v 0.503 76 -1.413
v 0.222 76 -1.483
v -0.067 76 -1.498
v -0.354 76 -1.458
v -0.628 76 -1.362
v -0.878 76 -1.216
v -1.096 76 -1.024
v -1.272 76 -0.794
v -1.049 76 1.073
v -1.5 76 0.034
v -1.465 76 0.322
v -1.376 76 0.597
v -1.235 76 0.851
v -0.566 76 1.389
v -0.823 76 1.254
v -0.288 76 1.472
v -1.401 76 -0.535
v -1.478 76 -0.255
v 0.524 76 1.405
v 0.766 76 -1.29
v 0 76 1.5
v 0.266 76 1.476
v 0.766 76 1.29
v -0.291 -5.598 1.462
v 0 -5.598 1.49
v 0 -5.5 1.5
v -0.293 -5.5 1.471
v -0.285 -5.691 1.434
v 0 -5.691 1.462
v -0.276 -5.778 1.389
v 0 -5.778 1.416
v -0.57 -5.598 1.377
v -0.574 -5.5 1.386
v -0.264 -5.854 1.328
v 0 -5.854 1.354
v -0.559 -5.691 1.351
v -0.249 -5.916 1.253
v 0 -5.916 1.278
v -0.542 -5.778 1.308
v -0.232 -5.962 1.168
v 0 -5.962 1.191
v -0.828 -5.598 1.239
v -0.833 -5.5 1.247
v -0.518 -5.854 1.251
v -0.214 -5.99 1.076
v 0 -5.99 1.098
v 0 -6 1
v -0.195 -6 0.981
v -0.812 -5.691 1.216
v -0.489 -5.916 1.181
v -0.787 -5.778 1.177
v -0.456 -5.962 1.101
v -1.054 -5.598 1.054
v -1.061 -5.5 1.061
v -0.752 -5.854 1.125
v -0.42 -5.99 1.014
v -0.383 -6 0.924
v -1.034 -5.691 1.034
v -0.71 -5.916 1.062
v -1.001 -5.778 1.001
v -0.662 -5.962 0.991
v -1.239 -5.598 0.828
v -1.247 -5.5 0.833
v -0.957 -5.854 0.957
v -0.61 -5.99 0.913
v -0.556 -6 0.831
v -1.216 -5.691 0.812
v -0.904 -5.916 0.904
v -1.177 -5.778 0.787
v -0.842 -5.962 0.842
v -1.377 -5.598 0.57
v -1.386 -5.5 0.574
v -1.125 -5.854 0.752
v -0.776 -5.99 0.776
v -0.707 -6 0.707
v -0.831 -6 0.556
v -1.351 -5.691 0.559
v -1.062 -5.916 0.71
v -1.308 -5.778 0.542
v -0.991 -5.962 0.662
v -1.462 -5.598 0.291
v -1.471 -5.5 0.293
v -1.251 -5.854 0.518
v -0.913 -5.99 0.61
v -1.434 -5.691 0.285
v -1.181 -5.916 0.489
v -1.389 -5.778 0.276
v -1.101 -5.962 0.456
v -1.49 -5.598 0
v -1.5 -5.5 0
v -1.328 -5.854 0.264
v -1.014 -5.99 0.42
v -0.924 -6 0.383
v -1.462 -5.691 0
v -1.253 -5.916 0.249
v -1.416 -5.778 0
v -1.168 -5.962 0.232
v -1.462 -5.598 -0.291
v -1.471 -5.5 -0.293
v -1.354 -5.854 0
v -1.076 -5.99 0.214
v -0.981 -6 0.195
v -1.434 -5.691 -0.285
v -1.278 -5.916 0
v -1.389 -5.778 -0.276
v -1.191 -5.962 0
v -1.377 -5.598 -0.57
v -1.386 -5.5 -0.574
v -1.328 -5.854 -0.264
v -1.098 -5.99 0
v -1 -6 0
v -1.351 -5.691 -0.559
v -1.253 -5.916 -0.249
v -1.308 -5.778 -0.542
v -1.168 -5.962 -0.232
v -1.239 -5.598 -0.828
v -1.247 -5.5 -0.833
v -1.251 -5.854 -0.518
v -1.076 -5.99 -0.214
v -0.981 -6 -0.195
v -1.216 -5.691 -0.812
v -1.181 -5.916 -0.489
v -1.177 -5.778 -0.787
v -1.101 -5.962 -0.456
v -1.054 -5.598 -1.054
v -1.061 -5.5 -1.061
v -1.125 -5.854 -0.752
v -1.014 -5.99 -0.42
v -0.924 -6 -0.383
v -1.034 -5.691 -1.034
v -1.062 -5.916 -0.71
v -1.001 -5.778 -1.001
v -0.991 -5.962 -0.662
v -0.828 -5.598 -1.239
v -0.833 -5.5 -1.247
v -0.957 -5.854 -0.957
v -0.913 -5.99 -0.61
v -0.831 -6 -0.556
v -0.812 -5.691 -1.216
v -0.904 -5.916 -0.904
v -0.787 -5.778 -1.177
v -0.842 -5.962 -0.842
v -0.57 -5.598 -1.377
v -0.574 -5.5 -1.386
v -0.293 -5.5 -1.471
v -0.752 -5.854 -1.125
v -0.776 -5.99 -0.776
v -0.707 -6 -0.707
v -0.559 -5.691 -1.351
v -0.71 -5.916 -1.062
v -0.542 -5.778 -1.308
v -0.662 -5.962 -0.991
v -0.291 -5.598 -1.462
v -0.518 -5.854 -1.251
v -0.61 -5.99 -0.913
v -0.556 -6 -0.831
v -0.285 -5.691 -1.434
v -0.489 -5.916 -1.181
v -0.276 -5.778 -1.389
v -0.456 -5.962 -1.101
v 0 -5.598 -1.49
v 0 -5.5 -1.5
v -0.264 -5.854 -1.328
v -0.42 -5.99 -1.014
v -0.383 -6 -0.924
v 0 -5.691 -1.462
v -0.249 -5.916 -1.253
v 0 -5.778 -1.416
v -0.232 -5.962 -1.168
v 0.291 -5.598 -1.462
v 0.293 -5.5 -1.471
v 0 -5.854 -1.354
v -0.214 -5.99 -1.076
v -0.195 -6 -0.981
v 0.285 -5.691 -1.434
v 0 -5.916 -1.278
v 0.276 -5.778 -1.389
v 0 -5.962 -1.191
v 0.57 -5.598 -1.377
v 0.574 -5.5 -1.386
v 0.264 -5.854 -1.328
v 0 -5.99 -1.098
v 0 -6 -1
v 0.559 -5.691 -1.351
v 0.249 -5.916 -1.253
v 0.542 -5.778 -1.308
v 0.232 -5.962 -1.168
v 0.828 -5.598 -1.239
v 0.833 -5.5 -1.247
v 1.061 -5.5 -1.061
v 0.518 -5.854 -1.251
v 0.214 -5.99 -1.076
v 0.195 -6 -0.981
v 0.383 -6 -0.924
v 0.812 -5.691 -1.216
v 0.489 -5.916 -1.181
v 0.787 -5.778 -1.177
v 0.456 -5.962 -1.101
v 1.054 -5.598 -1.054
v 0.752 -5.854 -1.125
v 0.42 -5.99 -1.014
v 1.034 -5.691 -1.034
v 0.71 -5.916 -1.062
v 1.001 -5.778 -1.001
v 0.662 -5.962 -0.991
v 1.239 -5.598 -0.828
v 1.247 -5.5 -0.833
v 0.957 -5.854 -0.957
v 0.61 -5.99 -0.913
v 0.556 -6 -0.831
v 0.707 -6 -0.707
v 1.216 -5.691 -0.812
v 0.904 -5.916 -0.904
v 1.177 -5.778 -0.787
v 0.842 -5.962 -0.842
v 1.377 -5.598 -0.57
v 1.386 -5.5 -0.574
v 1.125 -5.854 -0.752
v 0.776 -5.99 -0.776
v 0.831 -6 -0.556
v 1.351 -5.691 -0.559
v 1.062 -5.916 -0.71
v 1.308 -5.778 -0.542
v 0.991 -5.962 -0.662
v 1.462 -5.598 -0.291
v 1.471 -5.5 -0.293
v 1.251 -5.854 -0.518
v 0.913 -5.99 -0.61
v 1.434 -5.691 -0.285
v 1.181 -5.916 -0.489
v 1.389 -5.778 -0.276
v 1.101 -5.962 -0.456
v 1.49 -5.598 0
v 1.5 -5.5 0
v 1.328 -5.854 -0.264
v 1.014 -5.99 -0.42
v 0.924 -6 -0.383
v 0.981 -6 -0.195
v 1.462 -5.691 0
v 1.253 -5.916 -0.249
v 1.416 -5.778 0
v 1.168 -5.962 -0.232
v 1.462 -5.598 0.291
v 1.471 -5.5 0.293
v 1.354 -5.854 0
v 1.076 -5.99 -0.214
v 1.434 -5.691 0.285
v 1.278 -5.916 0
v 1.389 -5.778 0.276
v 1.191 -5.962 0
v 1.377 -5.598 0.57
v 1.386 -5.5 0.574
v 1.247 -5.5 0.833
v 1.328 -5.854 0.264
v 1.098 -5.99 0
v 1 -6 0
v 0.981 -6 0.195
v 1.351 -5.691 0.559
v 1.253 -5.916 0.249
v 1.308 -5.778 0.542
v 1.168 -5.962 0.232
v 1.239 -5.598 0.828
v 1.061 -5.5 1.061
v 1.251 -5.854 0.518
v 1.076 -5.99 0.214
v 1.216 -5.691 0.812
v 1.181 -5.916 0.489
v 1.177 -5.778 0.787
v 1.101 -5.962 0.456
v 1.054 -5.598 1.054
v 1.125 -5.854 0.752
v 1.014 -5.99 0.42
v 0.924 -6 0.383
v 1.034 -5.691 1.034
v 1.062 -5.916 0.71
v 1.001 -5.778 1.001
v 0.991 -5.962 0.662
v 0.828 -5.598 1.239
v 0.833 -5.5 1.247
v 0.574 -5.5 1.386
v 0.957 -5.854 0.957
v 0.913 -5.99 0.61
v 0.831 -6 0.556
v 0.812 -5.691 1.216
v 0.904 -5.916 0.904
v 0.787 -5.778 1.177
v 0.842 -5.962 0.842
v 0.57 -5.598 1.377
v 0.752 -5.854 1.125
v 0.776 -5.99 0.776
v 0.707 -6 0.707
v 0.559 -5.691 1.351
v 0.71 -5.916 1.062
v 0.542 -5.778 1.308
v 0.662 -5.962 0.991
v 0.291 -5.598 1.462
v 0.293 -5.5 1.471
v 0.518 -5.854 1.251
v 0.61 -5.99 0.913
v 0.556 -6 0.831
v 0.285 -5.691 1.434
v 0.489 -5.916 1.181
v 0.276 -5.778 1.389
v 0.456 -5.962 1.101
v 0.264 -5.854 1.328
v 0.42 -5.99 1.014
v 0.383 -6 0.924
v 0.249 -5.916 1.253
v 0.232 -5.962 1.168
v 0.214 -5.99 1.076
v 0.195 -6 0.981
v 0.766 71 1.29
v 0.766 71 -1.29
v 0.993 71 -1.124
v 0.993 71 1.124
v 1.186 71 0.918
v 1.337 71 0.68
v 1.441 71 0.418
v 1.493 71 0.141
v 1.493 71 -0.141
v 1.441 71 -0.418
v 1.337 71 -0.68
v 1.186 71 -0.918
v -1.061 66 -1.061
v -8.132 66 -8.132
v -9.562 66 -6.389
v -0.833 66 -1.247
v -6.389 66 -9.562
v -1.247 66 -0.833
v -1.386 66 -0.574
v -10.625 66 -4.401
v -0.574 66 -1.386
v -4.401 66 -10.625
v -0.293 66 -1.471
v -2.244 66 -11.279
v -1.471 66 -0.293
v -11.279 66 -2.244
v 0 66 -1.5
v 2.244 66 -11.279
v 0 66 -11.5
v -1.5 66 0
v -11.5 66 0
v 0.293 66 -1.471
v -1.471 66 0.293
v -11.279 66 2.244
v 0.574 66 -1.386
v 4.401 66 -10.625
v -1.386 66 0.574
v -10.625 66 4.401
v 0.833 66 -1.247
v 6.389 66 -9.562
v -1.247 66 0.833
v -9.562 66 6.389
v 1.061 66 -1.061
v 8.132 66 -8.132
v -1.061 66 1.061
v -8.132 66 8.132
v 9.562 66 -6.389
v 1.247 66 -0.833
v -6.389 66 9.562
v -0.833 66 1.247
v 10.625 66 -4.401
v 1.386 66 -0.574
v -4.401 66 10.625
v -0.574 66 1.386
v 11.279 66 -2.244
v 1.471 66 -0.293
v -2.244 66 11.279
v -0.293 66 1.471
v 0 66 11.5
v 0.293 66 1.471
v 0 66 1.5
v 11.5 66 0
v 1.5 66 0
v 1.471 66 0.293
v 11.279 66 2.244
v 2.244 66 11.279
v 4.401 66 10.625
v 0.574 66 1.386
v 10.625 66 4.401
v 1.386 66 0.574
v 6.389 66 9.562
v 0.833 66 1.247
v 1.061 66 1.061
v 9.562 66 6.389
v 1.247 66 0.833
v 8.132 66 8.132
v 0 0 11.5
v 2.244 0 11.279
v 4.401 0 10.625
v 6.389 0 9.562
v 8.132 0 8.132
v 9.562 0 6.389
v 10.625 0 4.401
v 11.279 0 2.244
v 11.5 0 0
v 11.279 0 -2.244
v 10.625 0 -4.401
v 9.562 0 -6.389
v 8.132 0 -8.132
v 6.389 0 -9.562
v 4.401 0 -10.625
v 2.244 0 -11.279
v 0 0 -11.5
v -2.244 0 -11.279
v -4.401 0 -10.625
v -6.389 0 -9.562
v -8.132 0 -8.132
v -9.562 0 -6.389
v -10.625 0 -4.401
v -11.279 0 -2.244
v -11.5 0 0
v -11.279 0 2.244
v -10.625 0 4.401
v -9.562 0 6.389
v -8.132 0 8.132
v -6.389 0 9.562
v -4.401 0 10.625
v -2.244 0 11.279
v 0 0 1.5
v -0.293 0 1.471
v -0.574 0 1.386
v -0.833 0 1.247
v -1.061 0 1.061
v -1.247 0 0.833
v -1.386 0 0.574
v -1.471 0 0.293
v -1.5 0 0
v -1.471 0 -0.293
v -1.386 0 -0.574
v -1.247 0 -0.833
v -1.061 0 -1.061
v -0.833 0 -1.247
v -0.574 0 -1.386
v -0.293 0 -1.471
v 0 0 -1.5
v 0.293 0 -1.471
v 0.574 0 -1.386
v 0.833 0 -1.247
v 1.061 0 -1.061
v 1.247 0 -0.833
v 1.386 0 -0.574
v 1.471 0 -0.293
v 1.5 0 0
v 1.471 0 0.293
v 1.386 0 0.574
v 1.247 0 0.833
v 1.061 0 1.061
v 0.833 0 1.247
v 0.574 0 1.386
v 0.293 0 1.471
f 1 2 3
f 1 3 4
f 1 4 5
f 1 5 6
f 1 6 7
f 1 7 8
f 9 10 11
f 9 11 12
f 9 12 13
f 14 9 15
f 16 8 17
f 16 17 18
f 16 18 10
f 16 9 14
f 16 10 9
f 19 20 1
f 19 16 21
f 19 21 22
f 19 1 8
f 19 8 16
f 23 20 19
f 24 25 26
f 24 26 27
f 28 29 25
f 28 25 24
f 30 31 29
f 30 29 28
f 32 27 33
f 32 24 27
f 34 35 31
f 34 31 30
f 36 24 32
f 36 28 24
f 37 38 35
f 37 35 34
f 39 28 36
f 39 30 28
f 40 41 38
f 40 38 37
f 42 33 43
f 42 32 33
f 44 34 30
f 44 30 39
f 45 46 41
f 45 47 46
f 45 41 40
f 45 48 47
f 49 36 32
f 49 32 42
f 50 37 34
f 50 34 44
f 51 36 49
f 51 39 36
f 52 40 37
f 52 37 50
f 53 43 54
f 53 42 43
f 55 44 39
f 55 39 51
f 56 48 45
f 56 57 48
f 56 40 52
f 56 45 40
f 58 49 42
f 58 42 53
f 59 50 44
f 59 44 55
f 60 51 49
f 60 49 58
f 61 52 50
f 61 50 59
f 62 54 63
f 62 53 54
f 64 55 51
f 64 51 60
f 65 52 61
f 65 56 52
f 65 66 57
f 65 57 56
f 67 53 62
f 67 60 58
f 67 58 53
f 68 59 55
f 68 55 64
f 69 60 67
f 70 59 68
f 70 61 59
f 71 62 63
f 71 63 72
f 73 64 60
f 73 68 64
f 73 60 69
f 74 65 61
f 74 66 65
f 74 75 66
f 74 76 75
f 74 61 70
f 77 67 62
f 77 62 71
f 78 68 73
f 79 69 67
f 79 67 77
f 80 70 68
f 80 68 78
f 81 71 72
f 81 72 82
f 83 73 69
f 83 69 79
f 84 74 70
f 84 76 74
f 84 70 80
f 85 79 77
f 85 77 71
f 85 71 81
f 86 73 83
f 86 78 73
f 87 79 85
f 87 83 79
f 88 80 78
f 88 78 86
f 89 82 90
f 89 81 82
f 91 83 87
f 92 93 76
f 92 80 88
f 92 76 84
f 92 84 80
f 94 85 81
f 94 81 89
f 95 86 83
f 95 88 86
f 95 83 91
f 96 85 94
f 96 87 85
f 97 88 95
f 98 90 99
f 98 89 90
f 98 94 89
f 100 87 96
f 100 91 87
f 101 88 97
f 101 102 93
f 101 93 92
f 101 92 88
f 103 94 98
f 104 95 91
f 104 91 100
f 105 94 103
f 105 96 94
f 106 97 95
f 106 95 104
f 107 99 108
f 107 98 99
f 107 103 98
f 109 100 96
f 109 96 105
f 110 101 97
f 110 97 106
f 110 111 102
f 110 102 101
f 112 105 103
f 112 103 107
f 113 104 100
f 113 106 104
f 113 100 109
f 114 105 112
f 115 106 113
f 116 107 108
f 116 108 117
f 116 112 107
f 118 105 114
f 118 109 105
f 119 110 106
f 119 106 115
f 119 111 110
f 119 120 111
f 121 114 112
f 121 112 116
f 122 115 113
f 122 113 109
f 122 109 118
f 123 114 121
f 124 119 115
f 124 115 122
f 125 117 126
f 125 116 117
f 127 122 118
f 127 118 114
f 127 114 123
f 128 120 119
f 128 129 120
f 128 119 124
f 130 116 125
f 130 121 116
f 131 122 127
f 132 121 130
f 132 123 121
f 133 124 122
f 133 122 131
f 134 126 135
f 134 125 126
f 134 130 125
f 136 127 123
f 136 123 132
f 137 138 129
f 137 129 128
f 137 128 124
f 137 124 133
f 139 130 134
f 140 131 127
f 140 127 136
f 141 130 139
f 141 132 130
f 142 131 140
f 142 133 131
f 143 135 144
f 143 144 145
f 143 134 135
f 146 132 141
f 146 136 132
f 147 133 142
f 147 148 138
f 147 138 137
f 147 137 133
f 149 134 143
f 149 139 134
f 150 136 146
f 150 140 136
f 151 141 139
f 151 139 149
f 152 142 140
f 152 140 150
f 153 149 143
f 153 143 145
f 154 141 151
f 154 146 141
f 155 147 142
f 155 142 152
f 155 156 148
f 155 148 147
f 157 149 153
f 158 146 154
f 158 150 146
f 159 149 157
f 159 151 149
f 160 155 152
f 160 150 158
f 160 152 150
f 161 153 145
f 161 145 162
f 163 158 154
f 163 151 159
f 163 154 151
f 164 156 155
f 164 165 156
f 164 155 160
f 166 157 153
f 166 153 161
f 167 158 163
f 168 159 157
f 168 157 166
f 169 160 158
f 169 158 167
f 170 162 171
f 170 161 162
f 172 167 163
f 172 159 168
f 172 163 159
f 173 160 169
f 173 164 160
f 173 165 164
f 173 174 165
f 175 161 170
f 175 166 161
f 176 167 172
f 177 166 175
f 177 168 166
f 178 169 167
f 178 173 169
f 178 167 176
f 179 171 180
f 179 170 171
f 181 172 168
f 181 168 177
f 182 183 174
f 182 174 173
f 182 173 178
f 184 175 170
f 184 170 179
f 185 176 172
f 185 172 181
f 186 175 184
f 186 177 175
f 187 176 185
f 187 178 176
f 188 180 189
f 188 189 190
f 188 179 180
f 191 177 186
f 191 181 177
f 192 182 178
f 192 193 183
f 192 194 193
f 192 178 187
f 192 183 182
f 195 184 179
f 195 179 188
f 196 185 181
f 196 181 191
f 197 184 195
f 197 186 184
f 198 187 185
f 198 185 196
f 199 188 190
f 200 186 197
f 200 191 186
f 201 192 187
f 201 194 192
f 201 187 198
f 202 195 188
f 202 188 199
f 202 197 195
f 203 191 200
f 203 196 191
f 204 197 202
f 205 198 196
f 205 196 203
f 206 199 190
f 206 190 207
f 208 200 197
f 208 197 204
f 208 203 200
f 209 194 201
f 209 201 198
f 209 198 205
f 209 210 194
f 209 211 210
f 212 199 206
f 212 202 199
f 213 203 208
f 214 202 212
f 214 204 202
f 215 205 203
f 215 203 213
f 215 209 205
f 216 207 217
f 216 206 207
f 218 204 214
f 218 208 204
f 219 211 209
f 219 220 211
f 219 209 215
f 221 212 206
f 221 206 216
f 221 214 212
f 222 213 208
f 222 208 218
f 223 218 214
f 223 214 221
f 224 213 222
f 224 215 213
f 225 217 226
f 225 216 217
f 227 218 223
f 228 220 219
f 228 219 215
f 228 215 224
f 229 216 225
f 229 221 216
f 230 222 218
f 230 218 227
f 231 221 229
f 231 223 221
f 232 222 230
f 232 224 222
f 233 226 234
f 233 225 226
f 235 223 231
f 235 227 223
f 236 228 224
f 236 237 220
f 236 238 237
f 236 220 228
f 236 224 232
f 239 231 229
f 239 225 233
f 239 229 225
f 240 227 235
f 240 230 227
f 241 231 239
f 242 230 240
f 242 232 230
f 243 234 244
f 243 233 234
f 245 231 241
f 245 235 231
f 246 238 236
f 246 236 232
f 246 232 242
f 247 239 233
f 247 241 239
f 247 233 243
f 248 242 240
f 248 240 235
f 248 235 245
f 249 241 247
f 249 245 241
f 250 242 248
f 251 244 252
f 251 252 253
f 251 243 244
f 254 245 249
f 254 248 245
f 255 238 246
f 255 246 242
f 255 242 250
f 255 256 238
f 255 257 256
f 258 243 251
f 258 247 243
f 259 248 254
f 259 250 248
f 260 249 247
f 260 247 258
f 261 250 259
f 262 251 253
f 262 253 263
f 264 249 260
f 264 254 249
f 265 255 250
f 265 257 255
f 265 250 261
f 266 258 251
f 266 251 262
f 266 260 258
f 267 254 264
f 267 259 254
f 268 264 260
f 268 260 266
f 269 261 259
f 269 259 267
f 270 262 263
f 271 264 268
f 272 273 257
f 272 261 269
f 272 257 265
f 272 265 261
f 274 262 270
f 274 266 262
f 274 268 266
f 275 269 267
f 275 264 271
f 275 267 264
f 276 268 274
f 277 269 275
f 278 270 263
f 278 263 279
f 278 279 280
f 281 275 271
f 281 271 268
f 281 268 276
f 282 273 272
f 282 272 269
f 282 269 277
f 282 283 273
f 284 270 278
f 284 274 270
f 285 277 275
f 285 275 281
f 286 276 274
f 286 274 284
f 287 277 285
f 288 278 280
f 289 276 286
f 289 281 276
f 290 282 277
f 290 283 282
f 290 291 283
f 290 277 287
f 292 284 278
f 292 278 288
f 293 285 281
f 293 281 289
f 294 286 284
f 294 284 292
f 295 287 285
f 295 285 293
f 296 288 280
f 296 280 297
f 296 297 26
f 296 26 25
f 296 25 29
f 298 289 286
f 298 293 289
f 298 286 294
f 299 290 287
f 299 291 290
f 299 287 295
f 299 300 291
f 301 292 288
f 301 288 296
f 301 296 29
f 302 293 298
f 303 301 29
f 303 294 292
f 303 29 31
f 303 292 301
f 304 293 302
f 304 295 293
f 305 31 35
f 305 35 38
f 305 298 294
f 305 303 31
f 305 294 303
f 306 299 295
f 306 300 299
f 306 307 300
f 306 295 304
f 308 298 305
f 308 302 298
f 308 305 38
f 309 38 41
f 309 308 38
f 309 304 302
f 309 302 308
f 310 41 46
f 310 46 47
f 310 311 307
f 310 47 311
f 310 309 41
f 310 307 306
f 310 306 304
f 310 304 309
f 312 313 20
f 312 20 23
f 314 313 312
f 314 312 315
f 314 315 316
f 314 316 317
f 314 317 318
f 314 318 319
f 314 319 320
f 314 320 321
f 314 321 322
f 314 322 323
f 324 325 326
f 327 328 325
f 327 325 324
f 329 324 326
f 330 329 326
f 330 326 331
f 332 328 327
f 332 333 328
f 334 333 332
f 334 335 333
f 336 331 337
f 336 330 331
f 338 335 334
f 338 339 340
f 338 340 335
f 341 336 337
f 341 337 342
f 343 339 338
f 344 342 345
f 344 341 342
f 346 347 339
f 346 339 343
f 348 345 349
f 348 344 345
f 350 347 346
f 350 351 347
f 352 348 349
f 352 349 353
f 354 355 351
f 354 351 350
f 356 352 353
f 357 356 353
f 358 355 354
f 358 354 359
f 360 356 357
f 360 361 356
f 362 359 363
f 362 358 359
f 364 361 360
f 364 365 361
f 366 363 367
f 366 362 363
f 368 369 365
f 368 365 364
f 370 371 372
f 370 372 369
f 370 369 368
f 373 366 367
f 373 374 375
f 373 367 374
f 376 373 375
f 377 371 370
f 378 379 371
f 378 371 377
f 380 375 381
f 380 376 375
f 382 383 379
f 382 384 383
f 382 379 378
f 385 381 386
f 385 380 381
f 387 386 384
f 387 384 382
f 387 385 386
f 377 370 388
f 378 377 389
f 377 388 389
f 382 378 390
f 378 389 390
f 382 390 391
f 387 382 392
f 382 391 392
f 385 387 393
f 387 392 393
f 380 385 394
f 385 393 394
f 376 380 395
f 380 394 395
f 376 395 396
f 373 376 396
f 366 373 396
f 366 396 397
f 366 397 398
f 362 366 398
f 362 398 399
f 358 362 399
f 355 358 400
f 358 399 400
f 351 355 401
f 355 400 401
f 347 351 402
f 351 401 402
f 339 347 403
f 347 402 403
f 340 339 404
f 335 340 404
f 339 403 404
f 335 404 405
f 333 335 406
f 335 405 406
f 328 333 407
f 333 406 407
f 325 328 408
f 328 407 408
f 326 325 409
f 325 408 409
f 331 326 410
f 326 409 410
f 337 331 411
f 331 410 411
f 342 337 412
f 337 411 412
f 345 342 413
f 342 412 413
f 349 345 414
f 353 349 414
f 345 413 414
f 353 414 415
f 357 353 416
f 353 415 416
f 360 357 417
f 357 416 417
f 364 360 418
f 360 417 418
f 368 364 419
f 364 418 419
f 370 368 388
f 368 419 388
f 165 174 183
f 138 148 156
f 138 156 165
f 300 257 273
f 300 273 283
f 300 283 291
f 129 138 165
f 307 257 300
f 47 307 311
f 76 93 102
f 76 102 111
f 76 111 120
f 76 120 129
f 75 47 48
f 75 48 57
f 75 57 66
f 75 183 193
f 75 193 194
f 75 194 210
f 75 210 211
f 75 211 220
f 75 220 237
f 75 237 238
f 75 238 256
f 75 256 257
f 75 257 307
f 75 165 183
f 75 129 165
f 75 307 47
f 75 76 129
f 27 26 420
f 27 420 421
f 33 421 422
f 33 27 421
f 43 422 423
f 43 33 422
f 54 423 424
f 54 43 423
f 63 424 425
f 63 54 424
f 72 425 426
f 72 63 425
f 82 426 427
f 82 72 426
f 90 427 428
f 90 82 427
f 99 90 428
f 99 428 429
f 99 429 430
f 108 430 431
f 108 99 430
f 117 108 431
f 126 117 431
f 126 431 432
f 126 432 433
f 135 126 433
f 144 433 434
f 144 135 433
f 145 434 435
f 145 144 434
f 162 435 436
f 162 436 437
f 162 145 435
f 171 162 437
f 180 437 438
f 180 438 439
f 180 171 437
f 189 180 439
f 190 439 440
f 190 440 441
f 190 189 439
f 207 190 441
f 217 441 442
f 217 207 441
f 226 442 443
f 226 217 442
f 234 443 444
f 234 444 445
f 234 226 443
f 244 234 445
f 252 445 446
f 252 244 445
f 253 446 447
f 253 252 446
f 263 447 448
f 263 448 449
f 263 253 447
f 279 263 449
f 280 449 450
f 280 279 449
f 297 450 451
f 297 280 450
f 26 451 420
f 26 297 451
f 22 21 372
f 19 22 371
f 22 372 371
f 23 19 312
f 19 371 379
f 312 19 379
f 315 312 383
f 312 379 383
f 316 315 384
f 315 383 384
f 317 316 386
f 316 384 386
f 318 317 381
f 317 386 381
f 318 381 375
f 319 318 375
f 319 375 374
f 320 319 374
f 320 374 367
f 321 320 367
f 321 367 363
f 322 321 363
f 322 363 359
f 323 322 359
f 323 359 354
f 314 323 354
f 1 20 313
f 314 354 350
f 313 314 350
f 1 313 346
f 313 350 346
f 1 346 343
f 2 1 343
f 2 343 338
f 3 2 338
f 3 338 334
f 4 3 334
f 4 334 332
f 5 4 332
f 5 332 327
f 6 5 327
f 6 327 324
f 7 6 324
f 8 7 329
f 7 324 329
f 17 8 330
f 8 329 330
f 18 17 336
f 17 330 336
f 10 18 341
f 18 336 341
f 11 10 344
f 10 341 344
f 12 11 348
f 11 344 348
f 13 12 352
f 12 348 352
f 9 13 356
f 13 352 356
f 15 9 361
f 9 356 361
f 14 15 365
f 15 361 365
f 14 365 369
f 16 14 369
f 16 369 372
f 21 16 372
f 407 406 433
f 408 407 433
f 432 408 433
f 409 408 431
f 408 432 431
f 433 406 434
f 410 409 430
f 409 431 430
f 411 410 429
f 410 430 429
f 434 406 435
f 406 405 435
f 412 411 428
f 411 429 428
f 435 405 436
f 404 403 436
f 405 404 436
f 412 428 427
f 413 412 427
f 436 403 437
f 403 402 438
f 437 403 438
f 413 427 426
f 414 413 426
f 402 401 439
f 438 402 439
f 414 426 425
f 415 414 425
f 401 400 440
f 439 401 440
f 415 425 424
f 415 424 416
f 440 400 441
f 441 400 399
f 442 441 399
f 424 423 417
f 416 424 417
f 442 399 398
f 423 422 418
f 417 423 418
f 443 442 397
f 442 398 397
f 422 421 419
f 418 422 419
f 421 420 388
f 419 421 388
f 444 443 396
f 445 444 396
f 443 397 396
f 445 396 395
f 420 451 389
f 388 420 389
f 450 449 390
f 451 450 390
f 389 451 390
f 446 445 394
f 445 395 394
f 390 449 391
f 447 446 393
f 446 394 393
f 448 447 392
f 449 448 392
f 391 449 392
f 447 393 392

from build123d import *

# Parameters (mm, degrees)
SKETCH1_R           = 11.5
BOSS_EXTRUDE1_DEPTH = 66
SKETCH2_R           = 1.5
BOSS_EXTRUDE2_DEPTH = 10
BOSS_EXTRUDE4_START = 6
SKETCH4_R           = 1.5
BOSS_EXTRUDE4_DEPTH = 6
FILLET1_R           = 0.5
CUT_EXTRUDE1_START  = -5
CUT_EXTRUDE1_DEPTH  = 5


with BuildPart() as part:
    # Sketch1 → Boss-Extrude1 (new body)
    with BuildSketch(Plane(origin=(0, 0, 0), x_dir=(1, 0, 0), z_dir=(0, 1, 0))):
        with Locations(Location((0, 0, 0), (0, 0, 270))):
            Circle(SKETCH1_R)
    extrude(amount=BOSS_EXTRUDE1_DEPTH)

    # Sketch2 → Boss-Extrude2 (add)
    with BuildSketch(Plane(origin=(0, 66, 0), x_dir=(1, 0, 0), z_dir=(0, 1, 0))):
        with Locations(Location((0, 0, 0), (0, 0, 270))):
            Circle(SKETCH2_R)
    extrude(amount=BOSS_EXTRUDE2_DEPTH)

    # Sketch4 → Boss-Extrude4 (add)
    with BuildSketch(Plane.XZ.offset(BOSS_EXTRUDE4_START)):
        with Locations(Location((0, 0, 0), (0, 0, 90))):
            Circle(SKETCH4_R)
    extrude(amount=-BOSS_EXTRUDE4_DEPTH)

    # Fillet1
    fillet1_edges = [part.edges().sort_by_distance(p)[0] for p in [
        (0, -6, -1.5),
    ]]
    fillet(fillet1_edges, radius=FILLET1_R)

    # Sketch5 → Cut-Extrude1 (cut)
    with BuildSketch(Plane(origin=(0, 76, 0), x_dir=(1, 0, 0), z_dir=(0, 1, 0)).offset(CUT_EXTRUDE1_START)):
        with BuildLine():
            Line((0.765599936, 1.289905709), (0.765599936, -1.289905709))
            ThreePointArc((0.765599936, -1.289905709), (1.5, 0), (0.765599936, 1.289905709))
        make_face()
    extrude(amount=CUT_EXTRUDE1_DEPTH, mode=Mode.SUBTRACT)


solid = part.part
